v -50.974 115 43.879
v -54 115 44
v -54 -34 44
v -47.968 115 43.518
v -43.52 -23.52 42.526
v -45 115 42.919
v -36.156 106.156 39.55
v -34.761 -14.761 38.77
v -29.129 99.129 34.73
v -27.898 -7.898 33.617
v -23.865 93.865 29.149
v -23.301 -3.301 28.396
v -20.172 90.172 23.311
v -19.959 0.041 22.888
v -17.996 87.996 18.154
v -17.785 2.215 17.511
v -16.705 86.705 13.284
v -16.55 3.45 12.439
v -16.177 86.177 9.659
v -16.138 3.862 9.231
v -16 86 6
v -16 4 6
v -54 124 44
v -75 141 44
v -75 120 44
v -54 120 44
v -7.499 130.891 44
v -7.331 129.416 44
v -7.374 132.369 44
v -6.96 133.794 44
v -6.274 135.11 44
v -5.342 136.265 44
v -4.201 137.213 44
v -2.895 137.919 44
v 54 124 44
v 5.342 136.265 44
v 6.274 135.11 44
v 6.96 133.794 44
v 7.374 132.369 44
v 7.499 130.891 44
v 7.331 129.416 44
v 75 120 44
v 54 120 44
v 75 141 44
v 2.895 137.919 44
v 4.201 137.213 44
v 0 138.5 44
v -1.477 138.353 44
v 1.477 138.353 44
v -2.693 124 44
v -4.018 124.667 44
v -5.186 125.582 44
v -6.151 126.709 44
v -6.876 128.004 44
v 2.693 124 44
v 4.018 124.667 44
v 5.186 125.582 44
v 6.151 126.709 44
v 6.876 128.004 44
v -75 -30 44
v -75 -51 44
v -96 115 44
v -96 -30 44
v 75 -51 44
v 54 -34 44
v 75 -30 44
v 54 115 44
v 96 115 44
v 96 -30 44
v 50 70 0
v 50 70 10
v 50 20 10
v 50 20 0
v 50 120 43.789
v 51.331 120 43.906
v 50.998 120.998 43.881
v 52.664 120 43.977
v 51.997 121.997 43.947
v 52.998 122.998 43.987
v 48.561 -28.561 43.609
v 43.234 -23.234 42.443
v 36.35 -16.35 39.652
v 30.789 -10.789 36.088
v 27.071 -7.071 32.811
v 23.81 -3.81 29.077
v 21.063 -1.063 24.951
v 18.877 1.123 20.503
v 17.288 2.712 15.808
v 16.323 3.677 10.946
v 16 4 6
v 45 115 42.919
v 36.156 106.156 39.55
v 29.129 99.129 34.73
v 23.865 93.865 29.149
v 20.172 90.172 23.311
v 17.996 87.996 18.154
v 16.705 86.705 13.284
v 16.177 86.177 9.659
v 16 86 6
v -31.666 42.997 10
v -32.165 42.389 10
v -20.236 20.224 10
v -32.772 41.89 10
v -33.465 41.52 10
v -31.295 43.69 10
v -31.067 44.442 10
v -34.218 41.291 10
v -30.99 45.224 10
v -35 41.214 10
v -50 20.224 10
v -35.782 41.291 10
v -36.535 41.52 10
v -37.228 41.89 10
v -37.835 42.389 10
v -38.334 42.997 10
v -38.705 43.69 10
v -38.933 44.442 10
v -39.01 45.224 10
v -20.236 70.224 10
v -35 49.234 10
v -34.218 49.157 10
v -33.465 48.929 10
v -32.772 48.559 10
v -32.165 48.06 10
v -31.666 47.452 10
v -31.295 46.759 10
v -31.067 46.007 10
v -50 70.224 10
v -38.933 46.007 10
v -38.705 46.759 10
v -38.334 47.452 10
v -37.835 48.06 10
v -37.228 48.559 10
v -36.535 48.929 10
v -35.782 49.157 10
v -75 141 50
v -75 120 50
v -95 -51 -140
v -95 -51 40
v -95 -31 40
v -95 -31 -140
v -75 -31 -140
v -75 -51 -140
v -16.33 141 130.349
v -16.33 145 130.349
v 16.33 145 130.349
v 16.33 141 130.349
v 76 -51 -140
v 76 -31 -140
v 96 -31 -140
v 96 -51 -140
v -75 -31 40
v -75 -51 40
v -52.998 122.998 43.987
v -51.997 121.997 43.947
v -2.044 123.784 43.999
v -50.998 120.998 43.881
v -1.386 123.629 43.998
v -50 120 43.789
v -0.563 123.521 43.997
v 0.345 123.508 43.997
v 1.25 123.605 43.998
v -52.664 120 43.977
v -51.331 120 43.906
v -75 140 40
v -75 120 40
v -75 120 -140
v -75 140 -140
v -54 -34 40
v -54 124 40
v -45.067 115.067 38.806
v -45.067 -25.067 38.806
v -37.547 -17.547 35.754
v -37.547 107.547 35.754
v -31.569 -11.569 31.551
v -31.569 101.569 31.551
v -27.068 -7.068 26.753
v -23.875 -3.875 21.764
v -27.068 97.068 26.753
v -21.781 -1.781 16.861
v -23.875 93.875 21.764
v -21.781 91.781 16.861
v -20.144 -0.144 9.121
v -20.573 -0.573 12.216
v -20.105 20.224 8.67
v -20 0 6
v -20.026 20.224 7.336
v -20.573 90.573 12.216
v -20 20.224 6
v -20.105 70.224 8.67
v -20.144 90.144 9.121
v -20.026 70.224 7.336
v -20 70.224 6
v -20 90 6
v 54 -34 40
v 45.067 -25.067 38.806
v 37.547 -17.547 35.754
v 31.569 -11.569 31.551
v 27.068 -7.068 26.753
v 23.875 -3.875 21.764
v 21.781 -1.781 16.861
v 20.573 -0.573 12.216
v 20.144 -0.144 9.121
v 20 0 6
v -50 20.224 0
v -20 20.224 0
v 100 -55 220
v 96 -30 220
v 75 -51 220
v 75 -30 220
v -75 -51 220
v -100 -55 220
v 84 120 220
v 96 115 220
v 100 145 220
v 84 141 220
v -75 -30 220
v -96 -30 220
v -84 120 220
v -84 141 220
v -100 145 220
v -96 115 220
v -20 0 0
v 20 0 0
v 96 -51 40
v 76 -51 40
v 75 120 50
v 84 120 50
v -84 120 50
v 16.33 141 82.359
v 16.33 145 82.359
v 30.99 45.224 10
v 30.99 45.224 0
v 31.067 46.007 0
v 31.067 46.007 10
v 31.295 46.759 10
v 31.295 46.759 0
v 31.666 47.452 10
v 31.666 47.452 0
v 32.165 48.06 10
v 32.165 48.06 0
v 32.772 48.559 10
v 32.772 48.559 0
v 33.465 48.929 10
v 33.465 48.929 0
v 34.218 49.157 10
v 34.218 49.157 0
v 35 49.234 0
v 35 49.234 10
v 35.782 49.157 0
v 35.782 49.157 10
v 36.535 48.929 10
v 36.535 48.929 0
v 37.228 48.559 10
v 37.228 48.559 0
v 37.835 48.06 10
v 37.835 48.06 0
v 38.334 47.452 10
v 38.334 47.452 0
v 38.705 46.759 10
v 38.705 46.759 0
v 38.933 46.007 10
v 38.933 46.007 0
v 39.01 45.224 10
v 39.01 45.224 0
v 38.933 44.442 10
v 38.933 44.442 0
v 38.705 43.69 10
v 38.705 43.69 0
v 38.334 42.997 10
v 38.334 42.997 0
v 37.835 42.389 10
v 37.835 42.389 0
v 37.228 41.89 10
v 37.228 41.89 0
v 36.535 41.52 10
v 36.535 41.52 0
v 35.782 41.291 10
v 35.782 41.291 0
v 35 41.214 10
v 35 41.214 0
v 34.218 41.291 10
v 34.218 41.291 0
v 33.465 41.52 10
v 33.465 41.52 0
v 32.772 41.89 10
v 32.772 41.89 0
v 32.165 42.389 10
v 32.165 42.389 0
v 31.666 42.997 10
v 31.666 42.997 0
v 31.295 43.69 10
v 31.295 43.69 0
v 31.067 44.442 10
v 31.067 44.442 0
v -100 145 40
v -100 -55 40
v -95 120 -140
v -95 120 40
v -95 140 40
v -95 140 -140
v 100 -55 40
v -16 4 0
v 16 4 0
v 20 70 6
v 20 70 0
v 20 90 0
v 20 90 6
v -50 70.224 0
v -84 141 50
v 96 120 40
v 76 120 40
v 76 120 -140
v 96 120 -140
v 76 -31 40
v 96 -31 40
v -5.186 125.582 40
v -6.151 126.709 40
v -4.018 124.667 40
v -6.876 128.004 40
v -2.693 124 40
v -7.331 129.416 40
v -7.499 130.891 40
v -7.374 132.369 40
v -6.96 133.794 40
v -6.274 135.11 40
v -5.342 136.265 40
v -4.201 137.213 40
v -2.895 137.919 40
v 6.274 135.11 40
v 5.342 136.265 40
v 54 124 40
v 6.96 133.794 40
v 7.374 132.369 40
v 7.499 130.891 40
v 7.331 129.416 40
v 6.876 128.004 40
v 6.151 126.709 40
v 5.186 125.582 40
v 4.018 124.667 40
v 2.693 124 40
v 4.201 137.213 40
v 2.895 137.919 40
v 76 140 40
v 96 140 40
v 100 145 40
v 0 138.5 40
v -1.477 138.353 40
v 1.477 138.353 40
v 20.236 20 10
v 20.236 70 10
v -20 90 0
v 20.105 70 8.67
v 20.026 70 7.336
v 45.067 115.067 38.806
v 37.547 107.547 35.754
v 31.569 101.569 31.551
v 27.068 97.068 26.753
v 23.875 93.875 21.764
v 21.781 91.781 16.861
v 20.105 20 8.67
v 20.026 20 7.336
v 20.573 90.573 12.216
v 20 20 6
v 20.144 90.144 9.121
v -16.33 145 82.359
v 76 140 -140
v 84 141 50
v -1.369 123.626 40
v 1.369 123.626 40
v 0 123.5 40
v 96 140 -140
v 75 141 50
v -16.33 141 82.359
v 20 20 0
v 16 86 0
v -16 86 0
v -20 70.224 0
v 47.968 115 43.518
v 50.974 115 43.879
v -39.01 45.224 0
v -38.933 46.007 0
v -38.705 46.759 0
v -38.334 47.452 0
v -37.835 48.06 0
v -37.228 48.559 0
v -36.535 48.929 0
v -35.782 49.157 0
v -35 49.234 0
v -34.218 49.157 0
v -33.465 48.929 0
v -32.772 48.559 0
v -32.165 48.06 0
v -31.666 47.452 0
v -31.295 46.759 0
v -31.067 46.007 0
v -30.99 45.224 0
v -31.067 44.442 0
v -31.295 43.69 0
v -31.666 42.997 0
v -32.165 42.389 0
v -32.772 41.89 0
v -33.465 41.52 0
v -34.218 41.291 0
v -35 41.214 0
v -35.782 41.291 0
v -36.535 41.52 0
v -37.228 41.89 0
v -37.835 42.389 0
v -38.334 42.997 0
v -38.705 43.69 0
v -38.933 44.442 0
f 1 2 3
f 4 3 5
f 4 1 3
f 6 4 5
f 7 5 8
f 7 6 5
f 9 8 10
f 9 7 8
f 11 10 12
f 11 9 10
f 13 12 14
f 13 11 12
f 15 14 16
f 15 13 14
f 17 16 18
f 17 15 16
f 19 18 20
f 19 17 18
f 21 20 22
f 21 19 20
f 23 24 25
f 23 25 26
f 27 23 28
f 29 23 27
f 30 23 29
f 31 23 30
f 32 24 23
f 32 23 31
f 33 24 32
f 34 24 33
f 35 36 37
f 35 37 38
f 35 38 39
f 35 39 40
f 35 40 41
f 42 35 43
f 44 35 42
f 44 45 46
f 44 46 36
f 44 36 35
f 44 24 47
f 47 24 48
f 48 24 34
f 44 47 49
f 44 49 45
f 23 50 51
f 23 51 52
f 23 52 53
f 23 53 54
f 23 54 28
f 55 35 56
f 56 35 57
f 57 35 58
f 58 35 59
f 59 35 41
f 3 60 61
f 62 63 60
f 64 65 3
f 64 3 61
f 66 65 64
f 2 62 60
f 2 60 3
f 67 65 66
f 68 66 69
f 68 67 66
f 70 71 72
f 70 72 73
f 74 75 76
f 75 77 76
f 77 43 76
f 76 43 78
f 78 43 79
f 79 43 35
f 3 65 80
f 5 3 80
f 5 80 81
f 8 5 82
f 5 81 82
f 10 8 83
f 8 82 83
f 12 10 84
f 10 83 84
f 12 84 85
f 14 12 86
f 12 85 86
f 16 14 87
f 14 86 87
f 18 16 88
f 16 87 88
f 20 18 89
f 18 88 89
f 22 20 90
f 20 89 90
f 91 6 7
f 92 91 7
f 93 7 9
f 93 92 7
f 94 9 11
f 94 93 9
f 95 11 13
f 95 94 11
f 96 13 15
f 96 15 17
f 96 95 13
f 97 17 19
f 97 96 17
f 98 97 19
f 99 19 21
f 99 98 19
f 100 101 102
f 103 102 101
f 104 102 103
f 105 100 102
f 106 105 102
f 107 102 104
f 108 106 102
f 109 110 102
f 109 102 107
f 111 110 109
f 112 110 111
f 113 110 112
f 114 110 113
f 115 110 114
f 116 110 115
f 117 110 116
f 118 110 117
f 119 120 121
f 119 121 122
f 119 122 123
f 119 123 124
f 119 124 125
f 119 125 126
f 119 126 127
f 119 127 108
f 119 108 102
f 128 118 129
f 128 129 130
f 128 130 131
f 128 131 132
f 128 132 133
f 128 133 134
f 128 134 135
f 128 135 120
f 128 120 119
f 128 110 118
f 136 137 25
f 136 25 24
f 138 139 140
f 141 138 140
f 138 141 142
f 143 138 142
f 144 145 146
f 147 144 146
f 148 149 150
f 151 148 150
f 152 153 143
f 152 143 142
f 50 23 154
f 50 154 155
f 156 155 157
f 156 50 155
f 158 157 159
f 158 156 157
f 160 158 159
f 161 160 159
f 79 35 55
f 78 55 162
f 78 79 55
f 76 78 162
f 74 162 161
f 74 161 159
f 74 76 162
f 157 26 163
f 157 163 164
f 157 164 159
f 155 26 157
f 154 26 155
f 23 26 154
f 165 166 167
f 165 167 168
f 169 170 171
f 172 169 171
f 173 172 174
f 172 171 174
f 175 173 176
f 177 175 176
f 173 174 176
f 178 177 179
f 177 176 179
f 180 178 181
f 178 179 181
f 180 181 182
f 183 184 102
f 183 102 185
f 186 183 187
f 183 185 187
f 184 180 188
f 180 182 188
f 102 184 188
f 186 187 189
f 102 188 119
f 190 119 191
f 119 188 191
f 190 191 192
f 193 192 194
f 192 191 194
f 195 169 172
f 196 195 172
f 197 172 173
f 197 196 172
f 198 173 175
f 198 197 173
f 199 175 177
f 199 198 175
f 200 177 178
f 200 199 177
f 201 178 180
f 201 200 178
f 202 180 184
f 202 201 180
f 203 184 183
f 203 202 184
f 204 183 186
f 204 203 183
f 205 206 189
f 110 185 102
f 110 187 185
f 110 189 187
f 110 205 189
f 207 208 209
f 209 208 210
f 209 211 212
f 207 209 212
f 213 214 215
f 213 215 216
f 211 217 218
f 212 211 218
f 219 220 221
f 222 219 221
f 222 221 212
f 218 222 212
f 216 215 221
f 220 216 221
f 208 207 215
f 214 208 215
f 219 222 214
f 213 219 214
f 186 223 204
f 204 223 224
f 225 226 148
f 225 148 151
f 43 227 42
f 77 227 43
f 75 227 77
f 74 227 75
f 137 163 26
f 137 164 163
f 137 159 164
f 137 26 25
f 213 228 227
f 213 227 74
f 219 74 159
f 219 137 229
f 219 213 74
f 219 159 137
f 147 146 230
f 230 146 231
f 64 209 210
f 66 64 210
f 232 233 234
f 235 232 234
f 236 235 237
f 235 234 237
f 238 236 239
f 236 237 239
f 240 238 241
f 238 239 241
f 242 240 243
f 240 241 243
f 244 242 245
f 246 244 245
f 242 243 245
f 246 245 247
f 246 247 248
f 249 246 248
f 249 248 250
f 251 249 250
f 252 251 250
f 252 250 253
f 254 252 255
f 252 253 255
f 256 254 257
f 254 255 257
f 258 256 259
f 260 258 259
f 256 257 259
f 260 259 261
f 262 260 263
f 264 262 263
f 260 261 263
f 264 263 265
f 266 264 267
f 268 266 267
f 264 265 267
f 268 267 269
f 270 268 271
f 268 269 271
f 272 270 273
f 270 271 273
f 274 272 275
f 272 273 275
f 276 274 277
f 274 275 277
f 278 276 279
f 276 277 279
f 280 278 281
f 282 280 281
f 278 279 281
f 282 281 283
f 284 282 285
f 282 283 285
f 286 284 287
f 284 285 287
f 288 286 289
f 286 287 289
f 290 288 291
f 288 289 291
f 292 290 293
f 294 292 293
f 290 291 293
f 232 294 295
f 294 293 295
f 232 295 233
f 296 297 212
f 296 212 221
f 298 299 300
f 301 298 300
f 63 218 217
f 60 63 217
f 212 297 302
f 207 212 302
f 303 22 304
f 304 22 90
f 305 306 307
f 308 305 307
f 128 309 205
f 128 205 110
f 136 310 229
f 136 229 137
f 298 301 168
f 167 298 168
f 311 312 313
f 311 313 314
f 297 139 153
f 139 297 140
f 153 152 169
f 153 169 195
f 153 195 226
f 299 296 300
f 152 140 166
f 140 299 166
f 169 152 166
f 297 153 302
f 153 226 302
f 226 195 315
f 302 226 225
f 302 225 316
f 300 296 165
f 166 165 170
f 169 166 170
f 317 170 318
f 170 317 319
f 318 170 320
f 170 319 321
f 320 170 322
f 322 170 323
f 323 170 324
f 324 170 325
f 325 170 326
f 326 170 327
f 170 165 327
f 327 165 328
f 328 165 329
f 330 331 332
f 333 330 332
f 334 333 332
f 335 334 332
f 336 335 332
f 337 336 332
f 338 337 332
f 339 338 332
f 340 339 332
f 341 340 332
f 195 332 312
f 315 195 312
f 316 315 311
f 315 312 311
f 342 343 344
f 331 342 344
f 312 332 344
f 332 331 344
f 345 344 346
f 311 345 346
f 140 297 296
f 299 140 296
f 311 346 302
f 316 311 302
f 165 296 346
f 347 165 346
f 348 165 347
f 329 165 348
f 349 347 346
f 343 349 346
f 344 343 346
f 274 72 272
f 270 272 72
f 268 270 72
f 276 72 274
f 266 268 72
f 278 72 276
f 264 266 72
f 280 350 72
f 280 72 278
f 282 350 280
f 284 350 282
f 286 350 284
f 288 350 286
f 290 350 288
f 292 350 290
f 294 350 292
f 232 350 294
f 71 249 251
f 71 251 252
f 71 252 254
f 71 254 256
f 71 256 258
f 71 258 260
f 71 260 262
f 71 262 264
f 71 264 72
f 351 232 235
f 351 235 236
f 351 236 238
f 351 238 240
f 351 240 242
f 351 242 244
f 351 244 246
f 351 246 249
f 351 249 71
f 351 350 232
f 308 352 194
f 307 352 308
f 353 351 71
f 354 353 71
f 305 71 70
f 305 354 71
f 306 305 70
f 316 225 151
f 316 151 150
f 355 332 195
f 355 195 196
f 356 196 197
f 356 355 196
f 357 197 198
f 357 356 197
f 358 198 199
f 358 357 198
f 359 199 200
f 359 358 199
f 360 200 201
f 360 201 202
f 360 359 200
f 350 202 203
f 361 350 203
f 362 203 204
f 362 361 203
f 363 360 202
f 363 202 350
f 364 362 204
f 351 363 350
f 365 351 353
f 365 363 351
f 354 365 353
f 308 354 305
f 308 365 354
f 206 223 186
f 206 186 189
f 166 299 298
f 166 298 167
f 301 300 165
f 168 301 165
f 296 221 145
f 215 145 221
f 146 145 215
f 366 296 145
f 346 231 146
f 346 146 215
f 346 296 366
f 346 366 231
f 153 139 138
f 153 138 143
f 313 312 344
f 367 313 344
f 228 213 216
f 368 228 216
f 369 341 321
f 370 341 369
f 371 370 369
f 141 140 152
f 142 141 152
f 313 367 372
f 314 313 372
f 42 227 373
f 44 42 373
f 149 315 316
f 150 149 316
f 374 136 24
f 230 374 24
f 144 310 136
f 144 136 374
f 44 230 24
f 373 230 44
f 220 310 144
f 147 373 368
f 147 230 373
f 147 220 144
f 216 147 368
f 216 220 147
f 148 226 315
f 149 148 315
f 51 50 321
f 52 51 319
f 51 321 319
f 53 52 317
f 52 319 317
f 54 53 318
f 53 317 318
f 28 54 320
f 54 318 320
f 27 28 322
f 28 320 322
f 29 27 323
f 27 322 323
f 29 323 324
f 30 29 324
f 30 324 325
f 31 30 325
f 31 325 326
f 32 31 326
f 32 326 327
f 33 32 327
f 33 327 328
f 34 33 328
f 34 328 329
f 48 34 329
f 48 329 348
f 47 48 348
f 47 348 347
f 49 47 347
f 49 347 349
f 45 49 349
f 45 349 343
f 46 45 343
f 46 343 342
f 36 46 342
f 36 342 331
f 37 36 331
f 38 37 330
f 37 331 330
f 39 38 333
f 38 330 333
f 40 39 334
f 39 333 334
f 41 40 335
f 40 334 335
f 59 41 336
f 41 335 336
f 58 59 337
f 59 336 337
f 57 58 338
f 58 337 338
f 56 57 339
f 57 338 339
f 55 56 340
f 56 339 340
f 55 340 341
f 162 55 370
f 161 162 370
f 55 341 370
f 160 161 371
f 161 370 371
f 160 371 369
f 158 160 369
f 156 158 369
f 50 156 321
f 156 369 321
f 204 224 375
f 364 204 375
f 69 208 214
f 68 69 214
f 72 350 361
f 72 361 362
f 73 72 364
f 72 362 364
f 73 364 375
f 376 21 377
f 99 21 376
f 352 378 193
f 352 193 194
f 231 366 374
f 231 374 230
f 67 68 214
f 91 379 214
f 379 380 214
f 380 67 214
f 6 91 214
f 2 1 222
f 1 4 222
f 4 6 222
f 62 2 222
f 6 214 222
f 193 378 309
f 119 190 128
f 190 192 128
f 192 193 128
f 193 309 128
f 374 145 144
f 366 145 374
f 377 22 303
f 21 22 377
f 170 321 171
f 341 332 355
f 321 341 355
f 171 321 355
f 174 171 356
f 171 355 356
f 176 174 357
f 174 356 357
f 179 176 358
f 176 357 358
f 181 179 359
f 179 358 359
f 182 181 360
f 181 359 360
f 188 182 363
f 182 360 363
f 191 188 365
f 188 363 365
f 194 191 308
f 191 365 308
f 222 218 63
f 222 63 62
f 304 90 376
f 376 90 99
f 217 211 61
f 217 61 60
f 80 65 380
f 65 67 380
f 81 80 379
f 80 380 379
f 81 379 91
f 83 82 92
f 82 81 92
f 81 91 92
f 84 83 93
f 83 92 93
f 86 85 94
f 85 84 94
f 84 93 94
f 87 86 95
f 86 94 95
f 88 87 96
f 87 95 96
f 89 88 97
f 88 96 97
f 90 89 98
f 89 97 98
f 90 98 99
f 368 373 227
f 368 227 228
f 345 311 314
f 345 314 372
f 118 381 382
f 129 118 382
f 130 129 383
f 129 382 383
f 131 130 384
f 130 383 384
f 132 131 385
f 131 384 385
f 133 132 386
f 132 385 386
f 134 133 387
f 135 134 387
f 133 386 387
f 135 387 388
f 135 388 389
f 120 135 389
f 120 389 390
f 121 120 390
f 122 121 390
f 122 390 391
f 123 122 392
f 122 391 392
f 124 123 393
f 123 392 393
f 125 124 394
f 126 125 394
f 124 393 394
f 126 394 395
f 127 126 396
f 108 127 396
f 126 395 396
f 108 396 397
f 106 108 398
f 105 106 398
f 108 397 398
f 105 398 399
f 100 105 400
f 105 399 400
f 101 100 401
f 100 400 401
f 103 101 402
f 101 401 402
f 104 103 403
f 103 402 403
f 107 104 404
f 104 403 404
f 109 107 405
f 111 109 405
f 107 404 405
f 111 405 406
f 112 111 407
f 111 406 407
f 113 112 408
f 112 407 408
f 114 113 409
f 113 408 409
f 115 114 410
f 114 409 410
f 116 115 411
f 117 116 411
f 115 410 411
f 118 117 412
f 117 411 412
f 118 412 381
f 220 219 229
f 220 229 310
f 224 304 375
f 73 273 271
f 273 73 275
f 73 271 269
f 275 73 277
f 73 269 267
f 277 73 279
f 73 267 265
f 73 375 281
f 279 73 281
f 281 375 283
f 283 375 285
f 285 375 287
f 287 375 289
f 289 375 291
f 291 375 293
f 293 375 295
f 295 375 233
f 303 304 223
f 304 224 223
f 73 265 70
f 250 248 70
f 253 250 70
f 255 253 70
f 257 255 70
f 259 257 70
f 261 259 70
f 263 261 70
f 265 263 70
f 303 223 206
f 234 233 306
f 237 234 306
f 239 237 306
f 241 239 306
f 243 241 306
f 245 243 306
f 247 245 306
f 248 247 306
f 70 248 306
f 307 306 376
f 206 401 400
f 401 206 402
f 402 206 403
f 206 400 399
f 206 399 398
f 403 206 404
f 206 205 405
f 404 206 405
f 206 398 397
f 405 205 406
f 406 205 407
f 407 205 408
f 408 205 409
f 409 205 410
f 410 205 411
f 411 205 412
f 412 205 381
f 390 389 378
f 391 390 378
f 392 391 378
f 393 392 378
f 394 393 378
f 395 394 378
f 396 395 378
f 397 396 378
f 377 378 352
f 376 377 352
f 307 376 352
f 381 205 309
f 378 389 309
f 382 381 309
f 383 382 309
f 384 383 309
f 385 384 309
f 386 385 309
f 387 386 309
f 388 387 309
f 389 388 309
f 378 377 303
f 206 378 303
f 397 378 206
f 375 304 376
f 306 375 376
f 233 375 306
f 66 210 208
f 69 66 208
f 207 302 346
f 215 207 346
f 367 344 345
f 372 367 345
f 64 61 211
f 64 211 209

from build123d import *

# Parameters (mm, degrees)
SKETCH_1_W                       = 40
SKETCH_1_H                       = 90
EXTRUDE_1_DEPTH                  = 40
SKETCH_2_W                       = 200
SKETCH_2_H                       = 200
EXTRUDE_2_DEPTH                  = 180
FILLET_3_R                       = 34
SHELL_5_T                        = -4
SKETCH_5_W                       = 32
SKETCH_5_H                       = 82
CUT_EXTRUDE_3_DEPTH              = 18
SKETCH_6_W                       = 20
SKETCH_6_H                       = 20
EXTRUDE_3_DEPTH                  = 360
SKETCH_7_W                       = 21
SKETCH_7_H                       = 21
EXTRUDE_4_DEPTH                  = 180
PATTERN_LINEAR_1_COUNT           = 2
PATTERN_LINEAR_1_PITCH           = 171
PATTERN_LINEAR_2_COUNT           = 2
PATTERN_LINEAR_2_PITCH           = 171
PATTERN_LINEAR_2_COPY_1_SKETCH_W = 20
PATTERN_LINEAR_2_COPY_1_SKETCH_H = 20
PATTERN_LINEAR_2_COPY_1_DEPTH    = 360
PATTERN_LINEAR_2_COPY_2_SKETCH_W = 21
PATTERN_LINEAR_2_COPY_2_SKETCH_H = 21
PATTERN_LINEAR_2_COPY_2_DEPTH    = 180
EXTRUDE_START                    = 30
SKETCH_8_W                       = 10
SKETCH_8_H                       = 50
EXTRUDE_8_DEPTH                  = 30
SKETCH_11_W                      = 10
SKETCH_11_H                      = 50
EXTRUDE_9_DEPTH                  = 30
SKETCH_12_R                      = 4.01
CUT_EXTRUDE_4_DEPTH              = 10
EXTRUDE_10_REACH                 = 402.78
SKETCH_18_W                      = 9
SKETCH_18_H                      = 21
CUT_EXTRUDE_5_DEPTH              = 170
SKETCH_20_W                      = 32.66
SKETCH_20_H                      = 47.99
CUT_EXTRUDE_6_DEPTH              = 20
SKETCH_21_R                      = 7.5
CUT_EXTRUDE_7_DEPTH              = 260


with BuildPart() as part:
    # 草图1 → 凸台-拉伸1 (new body)
    with BuildSketch(Plane.XY):
        with Locations((0, 45)):
            Rectangle(SKETCH_1_W, SKETCH_1_H)
    extrude(amount=EXTRUDE_1_DEPTH)

    # 草图2 → 凸台-拉伸2 (add)
    with BuildSketch(Plane.XY.offset(40)):
        with Locations((0, 45)):
            Rectangle(SKETCH_2_W, SKETCH_2_H)
    extrude(amount=EXTRUDE_2_DEPTH)

    # 圆角3
    fillet_3_edges = [part.edges().sort_by_distance(p)[0] for p in [
        (20, 45, 40),
        (0, 90, 40),
        (-20, 45, 40),
        (0, 0, 40),
    ]]
    fillet(fillet_3_edges, radius=FILLET_3_R)

    # 抽壳5
    shell_5_openings = [part.faces().sort_by_distance(p)[0] for p in [
        (0, 45, 220),
    ]]
    offset(amount=SHELL_5_T, openings=shell_5_openings)

    # 草图5 → 切除-拉伸3 (cut)
    with BuildSketch(Plane.XY.offset(4)):
        with Locations((0, 45)):
            Rectangle(SKETCH_5_W, SKETCH_5_H)
    extrude(amount=-CUT_EXTRUDE_3_DEPTH, mode=Mode.SUBTRACT)

    # 草图6 → 凸台-拉伸3 (add)
    with BuildSketch(Plane.XY.offset(220)):
        with Locations((-85, 130)):
            Rectangle(SKETCH_6_W, SKETCH_6_H)
    extrude_3 = extrude(amount=-EXTRUDE_3_DEPTH)

    # 草图7 → 凸台-拉伸4 (add)
    with BuildSketch(Plane.XY.offset(220)):
        with Locations((-85.5, 130.5)):
            Rectangle(SKETCH_7_W, SKETCH_7_H)
    extrude_4 = extrude(amount=-EXTRUDE_4_DEPTH)

    # 阵列(线性)1: 凸台-拉伸3, 凸台-拉伸4 ×2
    with Locations(*[(i * PATTERN_LINEAR_1_PITCH, 0, 0) for i in range(1, PATTERN_LINEAR_1_COUNT)]):
        add(extrude_3)
        add(extrude_4)

    # 阵列(线性)2: 凸台-拉伸3, 凸台-拉伸4 ×2
    with Locations(*[(0, -i * PATTERN_LINEAR_2_PITCH, 0) for i in range(1, PATTERN_LINEAR_2_COUNT)]):
        add(extrude_3)
        add(extrude_4)

    # 阵列(线性)2 copy 1 sketch → 阵列(线性)2 copy 1 (add)
    with BuildSketch(Plane(origin=(171, -171, 220), x_dir=(1, 0, 0), z_dir=(0, 0, 1))):
        with Locations((-85, 130)):
            Rectangle(PATTERN_LINEAR_2_COPY_1_SKETCH_W, PATTERN_LINEAR_2_COPY_1_SKETCH_H)
    extrude(amount=-PATTERN_LINEAR_2_COPY_1_DEPTH)

    # 阵列(线性)2 copy 2 sketch → 阵列(线性)2 copy 2 (add)
    with BuildSketch(Plane(origin=(171, -171, 220), x_dir=(1, 0, 0), z_dir=(0, 0, 1))):
        with Locations((-85.5, 130.5)):
            Rectangle(PATTERN_LINEAR_2_COPY_2_SKETCH_W, PATTERN_LINEAR_2_COPY_2_SKETCH_H)
    extrude(amount=-PATTERN_LINEAR_2_COPY_2_DEPTH)

    # 草图8 → 凸台-拉伸8 (add)
    with BuildSketch(Plane.ZY.offset(20).offset(EXTRUDE_START)):
        with Locations((5, 45.224395516)):
            Rectangle(SKETCH_8_W, SKETCH_8_H)
    extrude(amount=-EXTRUDE_8_DEPTH)

    # 草图11 → 凸台-拉伸9 (add)
    with BuildSketch(Plane(origin=(20, 0, 0), x_dir=(0, 0, -1), z_dir=(1, 0, 0))):
        with Locations((-5, 45)):
            Rectangle(SKETCH_11_W, SKETCH_11_H)
    extrude(amount=EXTRUDE_9_DEPTH)

    # 草图12 → 切除-拉伸4 (cut)
    with BuildSketch(Plane(origin=(0, 0, 0), x_dir=(-1, 0, 0), z_dir=(0, 0, -1))):
        with Locations((-35, 45.224395516)):
            Circle(SKETCH_12_R)
        with Locations((35, 45.224395516)):
            Circle(SKETCH_12_R)
    extrude(amount=-CUT_EXTRUDE_4_DEPTH, mode=Mode.SUBTRACT)

    # 草图17 → 凸台-拉伸10 (add, up to next)
    with BuildSketch(Plane.XY.offset(220), mode=Mode.PRIVATE) as extrude_10_sk1:
        Polygon((-75, 120), (75, 120), (96, 120), (96, 115), (-96, 115), (-96, 120), align=None)
    extrude_10_tool1 = extrude(extrude_10_sk1.sketch, amount=-EXTRUDE_10_REACH, mode=Mode.PRIVATE) - part.part
    add(extrude_10_tool1.solids().sort_by_distance((0, 117.5, 220))[0])

    # 草图18 → 切除-拉伸5 (cut)
    with BuildSketch(Plane.XY.offset(220)):
        with Locations((79.5, 130.5)):
            Rectangle(SKETCH_18_W, SKETCH_18_H)
        with Locations((-79.5, 130.5)):
            Rectangle(SKETCH_18_W, SKETCH_18_H)
    extrude(amount=-CUT_EXTRUDE_5_DEPTH, mode=Mode.SUBTRACT)

    # 草图20 → 切除-拉伸6 (cut)
    with BuildSketch(Plane(origin=(0, 145, 0), x_dir=(1, 0, 0), z_dir=(0, 1, 0))):
        with Locations((0, -106.354128517)):
            Rectangle(SKETCH_20_W, SKETCH_20_H)
    extrude(amount=-CUT_EXTRUDE_6_DEPTH, mode=Mode.SUBTRACT)

    # 草图21 → 切除-拉伸7 (cut)
    with BuildSketch(Plane(origin=(0, 0, 40), x_dir=(-1, 0, 0), z_dir=(0, 0, -1))):
        with Locations(Location((0, 131, 0), (0, 0, 291.039469781))):
            Circle(SKETCH_21_R)
    extrude(amount=-CUT_EXTRUDE_7_DEPTH, mode=Mode.SUBTRACT)


solid = part.part
